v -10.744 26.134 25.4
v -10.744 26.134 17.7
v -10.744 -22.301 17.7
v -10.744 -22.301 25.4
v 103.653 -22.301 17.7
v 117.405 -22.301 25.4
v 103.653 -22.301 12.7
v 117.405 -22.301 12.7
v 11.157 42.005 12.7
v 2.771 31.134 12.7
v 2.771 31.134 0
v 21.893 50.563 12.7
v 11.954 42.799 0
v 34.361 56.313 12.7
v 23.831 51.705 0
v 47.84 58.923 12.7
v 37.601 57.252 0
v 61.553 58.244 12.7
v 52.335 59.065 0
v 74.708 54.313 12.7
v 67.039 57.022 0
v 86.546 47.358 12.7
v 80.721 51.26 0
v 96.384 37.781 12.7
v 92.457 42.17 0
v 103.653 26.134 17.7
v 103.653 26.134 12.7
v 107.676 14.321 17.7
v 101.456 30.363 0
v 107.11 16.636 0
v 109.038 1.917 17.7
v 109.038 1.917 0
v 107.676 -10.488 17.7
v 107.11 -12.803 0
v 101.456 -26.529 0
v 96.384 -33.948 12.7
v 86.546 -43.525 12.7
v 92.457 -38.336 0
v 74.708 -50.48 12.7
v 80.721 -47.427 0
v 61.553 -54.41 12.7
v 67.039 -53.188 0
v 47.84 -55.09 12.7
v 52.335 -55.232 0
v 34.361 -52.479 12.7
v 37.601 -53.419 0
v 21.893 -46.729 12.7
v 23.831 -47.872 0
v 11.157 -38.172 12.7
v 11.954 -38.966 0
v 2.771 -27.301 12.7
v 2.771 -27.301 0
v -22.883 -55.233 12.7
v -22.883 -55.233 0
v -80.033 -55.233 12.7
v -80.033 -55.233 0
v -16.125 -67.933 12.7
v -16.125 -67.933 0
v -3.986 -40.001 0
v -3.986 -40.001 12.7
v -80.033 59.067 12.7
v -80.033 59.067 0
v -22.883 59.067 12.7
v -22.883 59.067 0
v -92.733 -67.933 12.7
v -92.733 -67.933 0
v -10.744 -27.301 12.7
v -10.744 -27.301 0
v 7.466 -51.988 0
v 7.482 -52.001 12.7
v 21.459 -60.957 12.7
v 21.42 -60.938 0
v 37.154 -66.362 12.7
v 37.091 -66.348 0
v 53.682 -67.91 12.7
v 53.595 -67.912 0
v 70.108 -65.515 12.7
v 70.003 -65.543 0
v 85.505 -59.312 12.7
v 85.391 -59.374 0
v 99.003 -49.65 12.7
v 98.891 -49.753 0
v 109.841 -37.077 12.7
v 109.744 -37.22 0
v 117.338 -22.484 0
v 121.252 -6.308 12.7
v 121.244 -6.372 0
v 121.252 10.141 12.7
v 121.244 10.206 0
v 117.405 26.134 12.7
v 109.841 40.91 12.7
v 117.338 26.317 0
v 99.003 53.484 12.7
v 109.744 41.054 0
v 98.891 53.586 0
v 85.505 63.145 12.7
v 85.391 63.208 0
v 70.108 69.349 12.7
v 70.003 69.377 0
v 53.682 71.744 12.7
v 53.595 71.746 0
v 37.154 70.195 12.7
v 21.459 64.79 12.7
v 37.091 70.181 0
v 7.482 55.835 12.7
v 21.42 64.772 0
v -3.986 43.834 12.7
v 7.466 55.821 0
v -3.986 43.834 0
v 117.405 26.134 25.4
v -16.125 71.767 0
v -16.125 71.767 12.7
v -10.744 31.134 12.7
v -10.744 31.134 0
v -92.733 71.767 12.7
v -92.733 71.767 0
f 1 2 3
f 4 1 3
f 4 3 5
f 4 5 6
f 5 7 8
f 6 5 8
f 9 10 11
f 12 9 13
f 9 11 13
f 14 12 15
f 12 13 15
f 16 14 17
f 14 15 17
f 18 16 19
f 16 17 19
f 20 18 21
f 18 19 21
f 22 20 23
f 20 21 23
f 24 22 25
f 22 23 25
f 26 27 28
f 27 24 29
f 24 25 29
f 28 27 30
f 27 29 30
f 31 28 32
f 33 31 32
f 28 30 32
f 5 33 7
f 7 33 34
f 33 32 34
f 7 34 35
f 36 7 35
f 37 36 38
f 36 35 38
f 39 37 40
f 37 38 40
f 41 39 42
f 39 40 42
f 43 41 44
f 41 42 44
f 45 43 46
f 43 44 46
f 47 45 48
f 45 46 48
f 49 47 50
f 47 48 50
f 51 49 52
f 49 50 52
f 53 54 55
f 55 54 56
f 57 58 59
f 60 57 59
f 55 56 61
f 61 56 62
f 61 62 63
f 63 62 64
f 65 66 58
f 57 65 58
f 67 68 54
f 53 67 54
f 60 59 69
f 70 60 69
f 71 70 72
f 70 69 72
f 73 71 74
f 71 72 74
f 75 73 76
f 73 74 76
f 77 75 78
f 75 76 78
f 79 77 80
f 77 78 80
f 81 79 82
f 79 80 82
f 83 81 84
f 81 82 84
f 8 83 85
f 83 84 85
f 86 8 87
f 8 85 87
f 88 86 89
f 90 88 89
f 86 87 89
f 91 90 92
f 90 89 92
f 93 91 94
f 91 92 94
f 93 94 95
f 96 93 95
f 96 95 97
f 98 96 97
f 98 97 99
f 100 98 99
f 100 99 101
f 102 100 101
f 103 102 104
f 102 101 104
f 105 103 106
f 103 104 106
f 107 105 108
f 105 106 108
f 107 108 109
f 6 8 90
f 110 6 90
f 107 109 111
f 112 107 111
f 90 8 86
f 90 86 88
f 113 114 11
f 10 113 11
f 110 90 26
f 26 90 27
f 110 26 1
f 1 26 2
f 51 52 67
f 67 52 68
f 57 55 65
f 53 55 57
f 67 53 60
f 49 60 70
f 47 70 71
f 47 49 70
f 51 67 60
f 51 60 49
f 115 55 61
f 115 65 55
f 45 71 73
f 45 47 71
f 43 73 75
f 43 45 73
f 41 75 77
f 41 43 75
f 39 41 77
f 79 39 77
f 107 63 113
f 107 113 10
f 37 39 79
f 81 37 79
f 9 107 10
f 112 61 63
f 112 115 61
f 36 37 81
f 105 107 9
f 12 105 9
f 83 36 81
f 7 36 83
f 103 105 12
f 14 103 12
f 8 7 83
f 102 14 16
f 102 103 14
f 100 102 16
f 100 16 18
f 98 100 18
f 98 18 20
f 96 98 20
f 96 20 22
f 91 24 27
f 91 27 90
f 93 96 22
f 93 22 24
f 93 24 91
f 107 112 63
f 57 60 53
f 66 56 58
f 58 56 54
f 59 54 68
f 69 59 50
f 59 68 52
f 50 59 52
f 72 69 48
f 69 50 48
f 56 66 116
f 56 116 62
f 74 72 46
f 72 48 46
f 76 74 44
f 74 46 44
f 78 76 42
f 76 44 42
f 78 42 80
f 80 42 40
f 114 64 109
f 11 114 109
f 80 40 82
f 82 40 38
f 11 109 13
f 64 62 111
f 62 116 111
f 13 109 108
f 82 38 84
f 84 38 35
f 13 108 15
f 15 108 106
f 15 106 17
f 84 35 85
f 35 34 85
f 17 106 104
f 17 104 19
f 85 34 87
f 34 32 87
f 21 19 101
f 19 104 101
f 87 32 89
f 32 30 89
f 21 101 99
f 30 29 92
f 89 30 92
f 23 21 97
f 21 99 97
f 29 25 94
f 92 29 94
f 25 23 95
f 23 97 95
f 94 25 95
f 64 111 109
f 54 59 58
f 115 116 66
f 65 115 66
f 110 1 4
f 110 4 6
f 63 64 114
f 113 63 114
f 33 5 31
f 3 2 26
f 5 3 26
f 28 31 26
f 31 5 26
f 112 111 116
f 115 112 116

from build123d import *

# Parameters (mm, degrees)
F3_DEPTH = 12.7
F5_DEPTH = 12.7
F6_DEPTH = 5


# Not quite as in the source:
# - a feature names something its author has since deleted; it is built from what else it names


with BuildPart() as f3:
    # F2 (on Top) → F3 (new body)
    with BuildSketch(Plane.XY):
        with BuildLine():
            Line((-3.986357704, 43.8342139564), (-16.1254491208, 71.7667039931))
            Line((-16.1254491208, 71.7667039931), (-92.733014825, 71.7667039931))
            Line((-92.733014825, 71.7667039931), (-92.733014825, -67.9332960069))
            Line((-92.733014825, -67.9332960069), (-16.1254491208, -67.9332960069))
            Line((-16.1254491208, -67.9332960069), (-3.986357704, -40.0008059702))
            ThreePointArc((-3.986357704, -40.0008059702), (121.738009035, 1.9167039931), (-3.986357704, 43.8342139564))
        make_face()
        with BuildLine():
            Line((-80.033014825, -55.2332960069), (-80.033014825, 59.0667039931))
            Line((-80.033014825, 59.0667039931), (-22.883014825, 59.0667039931))
            Line((-22.883014825, 59.0667039931), (-10.7439288273, 31.1342139564))
            Line((-10.7439288273, 31.1342139564), (2.7712134193, 31.1342139564))
            ThreePointArc((2.7712134193, 31.1342139564), (109.038009035, 1.9167039931), (2.7712134193, -27.3008059702))
            Line((2.7712134193, -27.3008059702), (-10.7439288273, -27.3008059702))
            Line((-10.7439288273, -27.3008059702), (-22.883014825, -55.2332960069))
            Line((-22.883014825, -55.2332960069), (-80.033014825, -55.2332960069))
        make_face(mode=Mode.SUBTRACT)
    extrude(amount=F3_DEPTH)

    # F4 (on face) → F5 (join)
    with BuildSketch(Plane.XY.offset(12.7)):
        with BuildLine():
            Line((103.6531972523, 26.1342139564), (-10.7439288273, 26.1342139564))
            Line((-10.7439288273, 26.1342139564), (-10.7439288273, -22.3008059702))
            Line((-10.7439288273, -22.3008059702), (103.6531972523, -22.3008059702))
            ThreePointArc((103.6531972523, -22.3008059702), (109.038009035, 1.9167039931), (103.6531972523, 26.1342139564))
        make_face()
        with BuildLine():
            Line((117.405447257, 26.1342139564), (103.6531972523, 26.1342139564))
            ThreePointArc((103.6531972523, 26.1342139564), (109.038009035, 1.9167039931), (103.6531972523, -22.3008059702))
            Line((103.6531972523, -22.3008059702), (117.405447257, -22.3008059702))
            Line((117.405447257, -22.3008059702), (117.405447257, 26.1342139564))
        make_face()
    extrude(amount=F5_DEPTH)

    # F6 (cut): a face of the model
    f6_faces = [f3.faces().sort_by_distance(p)[0] for p in [
        (48.2779564243, 1.9167039931, 12.7),
    ]]
    extrude(f6_faces, amount=-F6_DEPTH, mode=Mode.SUBTRACT)


solid = f3.part
